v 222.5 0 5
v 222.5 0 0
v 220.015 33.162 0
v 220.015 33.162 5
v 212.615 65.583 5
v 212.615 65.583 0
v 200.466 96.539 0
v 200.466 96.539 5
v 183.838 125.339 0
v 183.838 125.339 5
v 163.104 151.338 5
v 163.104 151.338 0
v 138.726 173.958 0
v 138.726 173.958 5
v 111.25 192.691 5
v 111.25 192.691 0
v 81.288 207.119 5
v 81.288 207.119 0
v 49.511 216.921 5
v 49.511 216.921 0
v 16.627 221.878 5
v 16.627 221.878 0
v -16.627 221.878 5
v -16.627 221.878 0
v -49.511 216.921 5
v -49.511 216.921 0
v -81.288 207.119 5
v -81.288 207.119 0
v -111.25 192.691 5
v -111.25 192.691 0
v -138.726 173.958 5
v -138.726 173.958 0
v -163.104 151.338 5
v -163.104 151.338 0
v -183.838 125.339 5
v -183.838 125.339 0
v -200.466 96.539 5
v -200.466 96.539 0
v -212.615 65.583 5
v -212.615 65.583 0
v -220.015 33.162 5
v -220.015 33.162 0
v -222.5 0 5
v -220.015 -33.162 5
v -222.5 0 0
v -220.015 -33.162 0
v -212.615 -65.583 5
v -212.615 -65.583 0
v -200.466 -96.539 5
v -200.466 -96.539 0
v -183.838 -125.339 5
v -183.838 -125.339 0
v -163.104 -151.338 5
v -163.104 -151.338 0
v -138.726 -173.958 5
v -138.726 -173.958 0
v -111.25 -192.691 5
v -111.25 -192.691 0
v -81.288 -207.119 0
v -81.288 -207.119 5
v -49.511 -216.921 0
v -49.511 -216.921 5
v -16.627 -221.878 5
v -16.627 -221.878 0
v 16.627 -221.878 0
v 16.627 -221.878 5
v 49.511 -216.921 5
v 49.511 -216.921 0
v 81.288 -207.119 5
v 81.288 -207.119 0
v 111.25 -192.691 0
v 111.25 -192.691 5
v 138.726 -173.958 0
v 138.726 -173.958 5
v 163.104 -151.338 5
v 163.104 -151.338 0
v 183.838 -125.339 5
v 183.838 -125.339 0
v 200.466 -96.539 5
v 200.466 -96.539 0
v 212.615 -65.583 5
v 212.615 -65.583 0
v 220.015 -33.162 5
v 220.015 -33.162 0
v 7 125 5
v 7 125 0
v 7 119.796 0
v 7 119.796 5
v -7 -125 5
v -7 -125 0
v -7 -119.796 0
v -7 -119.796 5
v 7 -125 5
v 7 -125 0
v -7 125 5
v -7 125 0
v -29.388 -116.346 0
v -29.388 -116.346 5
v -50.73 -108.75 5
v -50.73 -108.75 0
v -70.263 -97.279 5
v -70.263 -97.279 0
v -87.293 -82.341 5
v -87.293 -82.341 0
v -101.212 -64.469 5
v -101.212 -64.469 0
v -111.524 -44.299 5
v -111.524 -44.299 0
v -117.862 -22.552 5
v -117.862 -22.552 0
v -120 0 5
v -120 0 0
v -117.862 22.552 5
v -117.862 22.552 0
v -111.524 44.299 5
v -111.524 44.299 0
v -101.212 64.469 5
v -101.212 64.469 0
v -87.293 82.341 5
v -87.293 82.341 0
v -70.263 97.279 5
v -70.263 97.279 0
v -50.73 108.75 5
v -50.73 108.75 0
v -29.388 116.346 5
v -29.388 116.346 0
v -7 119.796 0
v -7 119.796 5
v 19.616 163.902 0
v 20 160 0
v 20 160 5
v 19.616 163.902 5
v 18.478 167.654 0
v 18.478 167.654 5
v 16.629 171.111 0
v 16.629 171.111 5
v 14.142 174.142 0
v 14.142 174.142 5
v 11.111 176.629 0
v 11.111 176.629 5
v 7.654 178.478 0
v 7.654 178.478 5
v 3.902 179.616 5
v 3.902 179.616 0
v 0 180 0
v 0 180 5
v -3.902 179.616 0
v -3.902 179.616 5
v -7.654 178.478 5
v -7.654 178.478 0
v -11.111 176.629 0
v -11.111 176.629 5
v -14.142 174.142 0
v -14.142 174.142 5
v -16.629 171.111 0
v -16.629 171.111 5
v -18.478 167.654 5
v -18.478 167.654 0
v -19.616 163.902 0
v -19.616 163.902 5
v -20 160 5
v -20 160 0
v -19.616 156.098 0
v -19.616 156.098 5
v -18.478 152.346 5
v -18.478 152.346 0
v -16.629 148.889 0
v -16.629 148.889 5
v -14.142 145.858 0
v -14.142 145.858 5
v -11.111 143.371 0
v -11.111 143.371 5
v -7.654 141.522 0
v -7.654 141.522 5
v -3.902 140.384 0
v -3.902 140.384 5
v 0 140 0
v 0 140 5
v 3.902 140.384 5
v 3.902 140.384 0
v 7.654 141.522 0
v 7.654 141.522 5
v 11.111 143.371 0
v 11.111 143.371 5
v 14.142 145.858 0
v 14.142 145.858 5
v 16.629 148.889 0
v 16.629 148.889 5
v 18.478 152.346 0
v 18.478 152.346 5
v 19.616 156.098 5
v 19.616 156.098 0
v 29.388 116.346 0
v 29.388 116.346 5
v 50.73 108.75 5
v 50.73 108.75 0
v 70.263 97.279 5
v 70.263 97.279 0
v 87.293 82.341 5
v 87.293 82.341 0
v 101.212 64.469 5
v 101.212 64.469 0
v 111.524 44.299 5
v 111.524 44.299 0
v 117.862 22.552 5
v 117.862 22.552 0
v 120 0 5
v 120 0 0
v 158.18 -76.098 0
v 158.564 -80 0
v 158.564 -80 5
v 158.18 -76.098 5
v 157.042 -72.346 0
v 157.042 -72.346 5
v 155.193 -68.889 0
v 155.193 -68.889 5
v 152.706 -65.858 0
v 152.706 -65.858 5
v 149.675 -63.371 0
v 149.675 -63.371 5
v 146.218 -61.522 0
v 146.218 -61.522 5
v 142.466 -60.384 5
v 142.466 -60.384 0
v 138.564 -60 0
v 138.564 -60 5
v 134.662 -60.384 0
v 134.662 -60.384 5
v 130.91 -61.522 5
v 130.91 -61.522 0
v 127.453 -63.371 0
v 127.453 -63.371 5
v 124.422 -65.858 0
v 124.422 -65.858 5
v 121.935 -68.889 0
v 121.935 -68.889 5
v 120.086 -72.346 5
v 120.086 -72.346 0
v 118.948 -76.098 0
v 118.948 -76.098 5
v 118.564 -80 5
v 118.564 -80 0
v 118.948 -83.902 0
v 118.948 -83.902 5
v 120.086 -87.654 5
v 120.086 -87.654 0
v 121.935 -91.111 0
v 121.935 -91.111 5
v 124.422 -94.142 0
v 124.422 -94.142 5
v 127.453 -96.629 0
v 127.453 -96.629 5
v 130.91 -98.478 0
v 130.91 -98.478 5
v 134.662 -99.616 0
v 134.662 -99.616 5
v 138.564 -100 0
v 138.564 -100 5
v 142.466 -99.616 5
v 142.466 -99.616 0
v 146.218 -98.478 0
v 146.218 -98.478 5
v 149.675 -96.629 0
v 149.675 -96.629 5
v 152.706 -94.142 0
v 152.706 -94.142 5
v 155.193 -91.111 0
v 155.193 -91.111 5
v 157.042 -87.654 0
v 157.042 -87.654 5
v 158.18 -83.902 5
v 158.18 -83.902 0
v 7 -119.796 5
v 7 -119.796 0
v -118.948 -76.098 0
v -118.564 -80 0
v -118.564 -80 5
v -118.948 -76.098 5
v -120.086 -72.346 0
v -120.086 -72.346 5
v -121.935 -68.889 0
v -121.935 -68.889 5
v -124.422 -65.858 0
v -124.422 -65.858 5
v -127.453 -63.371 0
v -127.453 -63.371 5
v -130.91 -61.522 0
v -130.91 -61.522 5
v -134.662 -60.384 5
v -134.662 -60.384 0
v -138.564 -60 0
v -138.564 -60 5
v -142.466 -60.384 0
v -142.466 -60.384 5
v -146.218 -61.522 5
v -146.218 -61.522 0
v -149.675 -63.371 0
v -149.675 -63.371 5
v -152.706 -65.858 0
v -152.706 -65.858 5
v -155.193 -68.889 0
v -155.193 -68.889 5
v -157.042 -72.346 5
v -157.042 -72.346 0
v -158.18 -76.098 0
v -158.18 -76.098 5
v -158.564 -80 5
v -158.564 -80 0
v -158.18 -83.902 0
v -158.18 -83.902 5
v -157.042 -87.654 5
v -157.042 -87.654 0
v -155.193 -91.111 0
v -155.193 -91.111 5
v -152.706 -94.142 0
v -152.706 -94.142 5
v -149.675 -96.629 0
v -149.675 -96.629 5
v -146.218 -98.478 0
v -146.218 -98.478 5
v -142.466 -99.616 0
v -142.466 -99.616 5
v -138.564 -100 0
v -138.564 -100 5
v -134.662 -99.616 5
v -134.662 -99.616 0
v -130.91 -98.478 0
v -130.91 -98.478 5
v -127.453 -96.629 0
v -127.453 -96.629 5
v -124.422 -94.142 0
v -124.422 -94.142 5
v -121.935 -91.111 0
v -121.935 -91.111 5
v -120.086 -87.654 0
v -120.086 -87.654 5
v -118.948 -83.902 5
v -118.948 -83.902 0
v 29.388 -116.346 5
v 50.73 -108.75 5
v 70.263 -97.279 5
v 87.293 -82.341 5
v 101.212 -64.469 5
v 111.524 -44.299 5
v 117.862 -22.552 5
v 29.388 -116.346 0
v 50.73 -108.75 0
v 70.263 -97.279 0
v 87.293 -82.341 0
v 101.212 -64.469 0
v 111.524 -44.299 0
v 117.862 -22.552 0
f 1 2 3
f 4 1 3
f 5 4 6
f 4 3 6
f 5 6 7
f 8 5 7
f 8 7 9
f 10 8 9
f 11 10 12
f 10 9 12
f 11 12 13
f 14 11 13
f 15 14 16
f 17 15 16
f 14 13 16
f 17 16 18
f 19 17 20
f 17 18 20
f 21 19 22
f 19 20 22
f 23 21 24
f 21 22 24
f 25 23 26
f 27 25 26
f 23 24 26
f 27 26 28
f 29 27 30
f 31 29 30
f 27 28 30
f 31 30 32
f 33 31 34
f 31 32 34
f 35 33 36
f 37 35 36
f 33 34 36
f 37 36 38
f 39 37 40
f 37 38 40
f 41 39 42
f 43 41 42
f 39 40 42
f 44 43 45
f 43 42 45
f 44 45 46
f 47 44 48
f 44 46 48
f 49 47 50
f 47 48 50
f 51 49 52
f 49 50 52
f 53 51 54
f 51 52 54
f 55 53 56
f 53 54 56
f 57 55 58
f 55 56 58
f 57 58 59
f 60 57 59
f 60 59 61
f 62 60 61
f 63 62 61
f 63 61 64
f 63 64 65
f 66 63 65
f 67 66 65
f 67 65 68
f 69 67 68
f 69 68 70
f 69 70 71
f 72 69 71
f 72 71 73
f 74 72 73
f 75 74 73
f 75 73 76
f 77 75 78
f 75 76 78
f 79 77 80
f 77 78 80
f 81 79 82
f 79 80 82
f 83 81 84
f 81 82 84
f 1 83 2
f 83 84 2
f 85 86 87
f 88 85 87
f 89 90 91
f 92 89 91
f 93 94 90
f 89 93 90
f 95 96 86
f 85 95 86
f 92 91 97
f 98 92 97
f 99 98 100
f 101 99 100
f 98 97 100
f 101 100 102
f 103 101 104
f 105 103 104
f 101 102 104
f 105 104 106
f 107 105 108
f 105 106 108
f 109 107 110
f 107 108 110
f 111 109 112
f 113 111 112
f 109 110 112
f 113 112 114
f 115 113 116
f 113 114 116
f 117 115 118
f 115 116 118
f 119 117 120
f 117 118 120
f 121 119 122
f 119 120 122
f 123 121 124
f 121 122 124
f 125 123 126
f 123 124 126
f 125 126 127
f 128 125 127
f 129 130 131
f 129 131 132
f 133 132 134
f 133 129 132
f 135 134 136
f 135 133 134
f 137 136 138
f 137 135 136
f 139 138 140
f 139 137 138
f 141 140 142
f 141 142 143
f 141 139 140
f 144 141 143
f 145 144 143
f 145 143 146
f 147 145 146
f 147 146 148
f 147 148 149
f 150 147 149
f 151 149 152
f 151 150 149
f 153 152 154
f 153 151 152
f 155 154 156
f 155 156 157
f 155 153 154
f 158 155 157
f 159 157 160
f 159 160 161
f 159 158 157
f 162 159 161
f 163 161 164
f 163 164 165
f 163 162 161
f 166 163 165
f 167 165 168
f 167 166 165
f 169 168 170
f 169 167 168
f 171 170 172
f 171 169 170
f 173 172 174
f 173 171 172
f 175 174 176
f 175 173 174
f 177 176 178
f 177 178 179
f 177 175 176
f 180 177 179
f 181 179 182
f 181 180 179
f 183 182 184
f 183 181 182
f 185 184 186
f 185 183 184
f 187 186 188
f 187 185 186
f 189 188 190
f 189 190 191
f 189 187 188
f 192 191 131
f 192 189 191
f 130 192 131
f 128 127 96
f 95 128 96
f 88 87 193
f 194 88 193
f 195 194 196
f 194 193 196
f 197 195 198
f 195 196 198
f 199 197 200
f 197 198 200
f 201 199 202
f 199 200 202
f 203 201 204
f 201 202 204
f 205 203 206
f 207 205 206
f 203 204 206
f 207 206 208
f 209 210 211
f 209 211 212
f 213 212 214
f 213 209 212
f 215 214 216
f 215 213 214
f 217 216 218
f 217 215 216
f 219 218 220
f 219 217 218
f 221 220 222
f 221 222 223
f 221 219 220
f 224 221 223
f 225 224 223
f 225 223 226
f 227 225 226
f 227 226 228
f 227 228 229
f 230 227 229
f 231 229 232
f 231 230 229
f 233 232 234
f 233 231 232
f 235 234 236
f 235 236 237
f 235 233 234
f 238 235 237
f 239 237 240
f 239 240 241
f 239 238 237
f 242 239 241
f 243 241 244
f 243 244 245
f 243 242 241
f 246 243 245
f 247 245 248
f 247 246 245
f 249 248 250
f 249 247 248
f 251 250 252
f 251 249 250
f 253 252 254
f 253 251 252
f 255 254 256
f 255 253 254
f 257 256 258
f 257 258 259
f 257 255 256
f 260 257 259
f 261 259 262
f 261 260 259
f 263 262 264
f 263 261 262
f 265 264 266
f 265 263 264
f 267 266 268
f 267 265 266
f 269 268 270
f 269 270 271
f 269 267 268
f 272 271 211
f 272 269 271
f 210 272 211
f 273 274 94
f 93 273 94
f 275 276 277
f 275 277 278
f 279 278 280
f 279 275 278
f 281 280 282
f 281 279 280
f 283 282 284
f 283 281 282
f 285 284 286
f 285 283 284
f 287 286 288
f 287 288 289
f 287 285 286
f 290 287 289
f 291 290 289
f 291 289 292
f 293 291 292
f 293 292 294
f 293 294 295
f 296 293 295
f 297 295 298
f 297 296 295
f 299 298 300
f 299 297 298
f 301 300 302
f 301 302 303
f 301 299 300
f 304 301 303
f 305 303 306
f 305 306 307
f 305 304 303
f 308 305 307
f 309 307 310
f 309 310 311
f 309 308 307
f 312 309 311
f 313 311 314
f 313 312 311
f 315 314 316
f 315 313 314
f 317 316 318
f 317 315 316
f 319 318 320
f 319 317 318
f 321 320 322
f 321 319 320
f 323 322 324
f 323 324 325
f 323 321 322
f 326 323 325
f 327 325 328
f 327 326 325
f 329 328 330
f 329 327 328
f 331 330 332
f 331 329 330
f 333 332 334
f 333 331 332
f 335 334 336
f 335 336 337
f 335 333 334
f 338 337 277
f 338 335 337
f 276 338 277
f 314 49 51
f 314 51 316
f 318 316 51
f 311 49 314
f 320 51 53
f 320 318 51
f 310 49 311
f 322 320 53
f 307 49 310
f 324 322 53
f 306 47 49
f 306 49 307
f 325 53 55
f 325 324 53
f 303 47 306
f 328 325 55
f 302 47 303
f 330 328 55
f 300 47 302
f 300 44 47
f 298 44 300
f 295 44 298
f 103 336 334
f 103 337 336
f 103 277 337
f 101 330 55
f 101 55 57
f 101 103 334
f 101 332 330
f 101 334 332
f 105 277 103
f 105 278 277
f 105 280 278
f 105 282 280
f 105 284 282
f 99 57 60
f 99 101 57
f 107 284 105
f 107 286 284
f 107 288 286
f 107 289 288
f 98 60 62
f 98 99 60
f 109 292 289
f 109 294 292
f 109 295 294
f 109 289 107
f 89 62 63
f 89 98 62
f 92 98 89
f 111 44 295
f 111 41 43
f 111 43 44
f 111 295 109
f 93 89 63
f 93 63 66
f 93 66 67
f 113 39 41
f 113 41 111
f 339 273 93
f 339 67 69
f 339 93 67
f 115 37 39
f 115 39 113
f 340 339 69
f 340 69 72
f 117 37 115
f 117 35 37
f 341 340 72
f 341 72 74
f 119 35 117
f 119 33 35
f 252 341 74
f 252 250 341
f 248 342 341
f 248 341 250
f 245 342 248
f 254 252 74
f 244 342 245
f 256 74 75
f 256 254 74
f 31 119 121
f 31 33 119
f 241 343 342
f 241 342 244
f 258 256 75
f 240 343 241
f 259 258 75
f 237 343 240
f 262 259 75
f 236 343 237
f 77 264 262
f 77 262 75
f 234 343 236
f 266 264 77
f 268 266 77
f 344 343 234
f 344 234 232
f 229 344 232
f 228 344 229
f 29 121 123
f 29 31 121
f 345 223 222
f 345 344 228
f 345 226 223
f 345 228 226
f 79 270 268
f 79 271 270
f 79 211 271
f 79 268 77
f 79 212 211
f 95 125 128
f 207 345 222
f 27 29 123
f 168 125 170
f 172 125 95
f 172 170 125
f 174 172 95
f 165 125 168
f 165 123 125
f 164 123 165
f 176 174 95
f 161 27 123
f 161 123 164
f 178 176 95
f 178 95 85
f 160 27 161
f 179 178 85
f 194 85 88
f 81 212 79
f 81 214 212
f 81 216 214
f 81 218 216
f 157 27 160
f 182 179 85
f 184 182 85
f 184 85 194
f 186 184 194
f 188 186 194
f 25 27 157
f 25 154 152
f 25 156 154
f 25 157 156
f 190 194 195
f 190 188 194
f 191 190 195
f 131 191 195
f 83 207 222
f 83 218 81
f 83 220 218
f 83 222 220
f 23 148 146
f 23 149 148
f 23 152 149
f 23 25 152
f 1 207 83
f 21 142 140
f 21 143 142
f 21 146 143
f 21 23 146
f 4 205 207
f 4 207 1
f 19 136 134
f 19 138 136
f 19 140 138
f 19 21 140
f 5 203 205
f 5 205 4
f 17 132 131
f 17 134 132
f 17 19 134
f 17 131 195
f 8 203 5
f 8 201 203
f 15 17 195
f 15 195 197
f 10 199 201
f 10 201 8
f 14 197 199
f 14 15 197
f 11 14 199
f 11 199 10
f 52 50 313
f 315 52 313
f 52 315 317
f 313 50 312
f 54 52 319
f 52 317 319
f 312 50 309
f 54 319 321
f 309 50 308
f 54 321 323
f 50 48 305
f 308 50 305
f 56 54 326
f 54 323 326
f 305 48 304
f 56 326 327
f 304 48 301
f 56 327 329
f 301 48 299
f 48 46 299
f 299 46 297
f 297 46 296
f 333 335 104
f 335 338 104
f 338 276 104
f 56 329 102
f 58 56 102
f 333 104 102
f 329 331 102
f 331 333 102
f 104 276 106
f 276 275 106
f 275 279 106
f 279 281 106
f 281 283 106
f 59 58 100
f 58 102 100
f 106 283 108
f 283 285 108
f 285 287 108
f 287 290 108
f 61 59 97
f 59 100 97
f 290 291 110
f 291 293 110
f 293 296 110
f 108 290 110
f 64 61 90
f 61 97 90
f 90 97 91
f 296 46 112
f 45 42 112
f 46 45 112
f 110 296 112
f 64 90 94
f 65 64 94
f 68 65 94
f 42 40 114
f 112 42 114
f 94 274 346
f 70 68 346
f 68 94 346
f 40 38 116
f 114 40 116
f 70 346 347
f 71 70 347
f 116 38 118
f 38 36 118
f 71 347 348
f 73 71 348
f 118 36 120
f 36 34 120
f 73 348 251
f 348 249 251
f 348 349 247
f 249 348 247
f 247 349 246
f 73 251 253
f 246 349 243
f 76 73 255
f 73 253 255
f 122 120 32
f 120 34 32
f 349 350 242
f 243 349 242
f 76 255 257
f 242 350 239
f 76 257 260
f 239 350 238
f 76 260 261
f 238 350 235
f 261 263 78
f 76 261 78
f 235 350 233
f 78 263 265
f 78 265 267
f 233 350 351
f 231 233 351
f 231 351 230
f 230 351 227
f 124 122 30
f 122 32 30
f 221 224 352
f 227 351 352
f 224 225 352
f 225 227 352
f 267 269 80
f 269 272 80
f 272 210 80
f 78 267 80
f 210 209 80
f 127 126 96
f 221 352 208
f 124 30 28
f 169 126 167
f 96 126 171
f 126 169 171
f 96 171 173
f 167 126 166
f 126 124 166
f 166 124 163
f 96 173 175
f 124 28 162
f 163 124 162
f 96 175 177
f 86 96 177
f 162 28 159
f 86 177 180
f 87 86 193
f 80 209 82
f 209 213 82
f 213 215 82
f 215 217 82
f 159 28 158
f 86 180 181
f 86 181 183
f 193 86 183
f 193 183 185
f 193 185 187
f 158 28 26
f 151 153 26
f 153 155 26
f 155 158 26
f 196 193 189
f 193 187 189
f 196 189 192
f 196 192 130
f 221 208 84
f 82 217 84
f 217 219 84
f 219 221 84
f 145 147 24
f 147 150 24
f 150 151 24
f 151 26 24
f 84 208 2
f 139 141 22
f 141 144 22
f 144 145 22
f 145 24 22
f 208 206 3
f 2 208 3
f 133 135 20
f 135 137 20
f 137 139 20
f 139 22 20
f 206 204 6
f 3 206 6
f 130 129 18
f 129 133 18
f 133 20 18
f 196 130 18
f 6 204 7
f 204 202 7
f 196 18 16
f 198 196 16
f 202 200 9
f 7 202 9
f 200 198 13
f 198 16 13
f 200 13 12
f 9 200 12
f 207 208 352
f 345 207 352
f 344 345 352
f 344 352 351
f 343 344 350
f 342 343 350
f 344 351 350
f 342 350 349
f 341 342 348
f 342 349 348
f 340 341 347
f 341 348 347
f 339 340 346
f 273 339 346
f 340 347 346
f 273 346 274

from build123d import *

# Parameters (mm, degrees)
F0_R     = 222.5
F0_R_2   = 20
F1_DEPTH = 5


with BuildPart() as f1:
    # F0 (on Top) → F1 (new body)
    with BuildSketch(Plane.XY):
        Circle(F0_R)
        with Locations((-138.564065, -80)):
            Circle(F0_R_2, mode=Mode.SUBTRACT)
        with Locations((138.564065, -80)):
            Circle(F0_R_2, mode=Mode.SUBTRACT)
        with BuildLine():
            ThreePointArc((7, 119.795659), (87.292611, 82.340755), (120, 0))
            ThreePointArc((120, 0), (87.292611, -82.340755), (7, -119.795659))
            Line((7, -119.795659), (7, -125))
            Line((7, -125), (-7, -125))
            Line((-7, -125), (-7, -119.795659))
            ThreePointArc((-7, -119.795659), (-120, 0), (-7, 119.795659))
            Line((-7, 119.795659), (-7, 125))
            Line((-7, 125), (7, 125))
            Line((7, 125), (7, 119.795659))
        make_face(mode=Mode.SUBTRACT)
        with Locations((0, 160)):
            Circle(F0_R_2, mode=Mode.SUBTRACT)
    extrude(amount=F1_DEPTH)


solid = f1.part
